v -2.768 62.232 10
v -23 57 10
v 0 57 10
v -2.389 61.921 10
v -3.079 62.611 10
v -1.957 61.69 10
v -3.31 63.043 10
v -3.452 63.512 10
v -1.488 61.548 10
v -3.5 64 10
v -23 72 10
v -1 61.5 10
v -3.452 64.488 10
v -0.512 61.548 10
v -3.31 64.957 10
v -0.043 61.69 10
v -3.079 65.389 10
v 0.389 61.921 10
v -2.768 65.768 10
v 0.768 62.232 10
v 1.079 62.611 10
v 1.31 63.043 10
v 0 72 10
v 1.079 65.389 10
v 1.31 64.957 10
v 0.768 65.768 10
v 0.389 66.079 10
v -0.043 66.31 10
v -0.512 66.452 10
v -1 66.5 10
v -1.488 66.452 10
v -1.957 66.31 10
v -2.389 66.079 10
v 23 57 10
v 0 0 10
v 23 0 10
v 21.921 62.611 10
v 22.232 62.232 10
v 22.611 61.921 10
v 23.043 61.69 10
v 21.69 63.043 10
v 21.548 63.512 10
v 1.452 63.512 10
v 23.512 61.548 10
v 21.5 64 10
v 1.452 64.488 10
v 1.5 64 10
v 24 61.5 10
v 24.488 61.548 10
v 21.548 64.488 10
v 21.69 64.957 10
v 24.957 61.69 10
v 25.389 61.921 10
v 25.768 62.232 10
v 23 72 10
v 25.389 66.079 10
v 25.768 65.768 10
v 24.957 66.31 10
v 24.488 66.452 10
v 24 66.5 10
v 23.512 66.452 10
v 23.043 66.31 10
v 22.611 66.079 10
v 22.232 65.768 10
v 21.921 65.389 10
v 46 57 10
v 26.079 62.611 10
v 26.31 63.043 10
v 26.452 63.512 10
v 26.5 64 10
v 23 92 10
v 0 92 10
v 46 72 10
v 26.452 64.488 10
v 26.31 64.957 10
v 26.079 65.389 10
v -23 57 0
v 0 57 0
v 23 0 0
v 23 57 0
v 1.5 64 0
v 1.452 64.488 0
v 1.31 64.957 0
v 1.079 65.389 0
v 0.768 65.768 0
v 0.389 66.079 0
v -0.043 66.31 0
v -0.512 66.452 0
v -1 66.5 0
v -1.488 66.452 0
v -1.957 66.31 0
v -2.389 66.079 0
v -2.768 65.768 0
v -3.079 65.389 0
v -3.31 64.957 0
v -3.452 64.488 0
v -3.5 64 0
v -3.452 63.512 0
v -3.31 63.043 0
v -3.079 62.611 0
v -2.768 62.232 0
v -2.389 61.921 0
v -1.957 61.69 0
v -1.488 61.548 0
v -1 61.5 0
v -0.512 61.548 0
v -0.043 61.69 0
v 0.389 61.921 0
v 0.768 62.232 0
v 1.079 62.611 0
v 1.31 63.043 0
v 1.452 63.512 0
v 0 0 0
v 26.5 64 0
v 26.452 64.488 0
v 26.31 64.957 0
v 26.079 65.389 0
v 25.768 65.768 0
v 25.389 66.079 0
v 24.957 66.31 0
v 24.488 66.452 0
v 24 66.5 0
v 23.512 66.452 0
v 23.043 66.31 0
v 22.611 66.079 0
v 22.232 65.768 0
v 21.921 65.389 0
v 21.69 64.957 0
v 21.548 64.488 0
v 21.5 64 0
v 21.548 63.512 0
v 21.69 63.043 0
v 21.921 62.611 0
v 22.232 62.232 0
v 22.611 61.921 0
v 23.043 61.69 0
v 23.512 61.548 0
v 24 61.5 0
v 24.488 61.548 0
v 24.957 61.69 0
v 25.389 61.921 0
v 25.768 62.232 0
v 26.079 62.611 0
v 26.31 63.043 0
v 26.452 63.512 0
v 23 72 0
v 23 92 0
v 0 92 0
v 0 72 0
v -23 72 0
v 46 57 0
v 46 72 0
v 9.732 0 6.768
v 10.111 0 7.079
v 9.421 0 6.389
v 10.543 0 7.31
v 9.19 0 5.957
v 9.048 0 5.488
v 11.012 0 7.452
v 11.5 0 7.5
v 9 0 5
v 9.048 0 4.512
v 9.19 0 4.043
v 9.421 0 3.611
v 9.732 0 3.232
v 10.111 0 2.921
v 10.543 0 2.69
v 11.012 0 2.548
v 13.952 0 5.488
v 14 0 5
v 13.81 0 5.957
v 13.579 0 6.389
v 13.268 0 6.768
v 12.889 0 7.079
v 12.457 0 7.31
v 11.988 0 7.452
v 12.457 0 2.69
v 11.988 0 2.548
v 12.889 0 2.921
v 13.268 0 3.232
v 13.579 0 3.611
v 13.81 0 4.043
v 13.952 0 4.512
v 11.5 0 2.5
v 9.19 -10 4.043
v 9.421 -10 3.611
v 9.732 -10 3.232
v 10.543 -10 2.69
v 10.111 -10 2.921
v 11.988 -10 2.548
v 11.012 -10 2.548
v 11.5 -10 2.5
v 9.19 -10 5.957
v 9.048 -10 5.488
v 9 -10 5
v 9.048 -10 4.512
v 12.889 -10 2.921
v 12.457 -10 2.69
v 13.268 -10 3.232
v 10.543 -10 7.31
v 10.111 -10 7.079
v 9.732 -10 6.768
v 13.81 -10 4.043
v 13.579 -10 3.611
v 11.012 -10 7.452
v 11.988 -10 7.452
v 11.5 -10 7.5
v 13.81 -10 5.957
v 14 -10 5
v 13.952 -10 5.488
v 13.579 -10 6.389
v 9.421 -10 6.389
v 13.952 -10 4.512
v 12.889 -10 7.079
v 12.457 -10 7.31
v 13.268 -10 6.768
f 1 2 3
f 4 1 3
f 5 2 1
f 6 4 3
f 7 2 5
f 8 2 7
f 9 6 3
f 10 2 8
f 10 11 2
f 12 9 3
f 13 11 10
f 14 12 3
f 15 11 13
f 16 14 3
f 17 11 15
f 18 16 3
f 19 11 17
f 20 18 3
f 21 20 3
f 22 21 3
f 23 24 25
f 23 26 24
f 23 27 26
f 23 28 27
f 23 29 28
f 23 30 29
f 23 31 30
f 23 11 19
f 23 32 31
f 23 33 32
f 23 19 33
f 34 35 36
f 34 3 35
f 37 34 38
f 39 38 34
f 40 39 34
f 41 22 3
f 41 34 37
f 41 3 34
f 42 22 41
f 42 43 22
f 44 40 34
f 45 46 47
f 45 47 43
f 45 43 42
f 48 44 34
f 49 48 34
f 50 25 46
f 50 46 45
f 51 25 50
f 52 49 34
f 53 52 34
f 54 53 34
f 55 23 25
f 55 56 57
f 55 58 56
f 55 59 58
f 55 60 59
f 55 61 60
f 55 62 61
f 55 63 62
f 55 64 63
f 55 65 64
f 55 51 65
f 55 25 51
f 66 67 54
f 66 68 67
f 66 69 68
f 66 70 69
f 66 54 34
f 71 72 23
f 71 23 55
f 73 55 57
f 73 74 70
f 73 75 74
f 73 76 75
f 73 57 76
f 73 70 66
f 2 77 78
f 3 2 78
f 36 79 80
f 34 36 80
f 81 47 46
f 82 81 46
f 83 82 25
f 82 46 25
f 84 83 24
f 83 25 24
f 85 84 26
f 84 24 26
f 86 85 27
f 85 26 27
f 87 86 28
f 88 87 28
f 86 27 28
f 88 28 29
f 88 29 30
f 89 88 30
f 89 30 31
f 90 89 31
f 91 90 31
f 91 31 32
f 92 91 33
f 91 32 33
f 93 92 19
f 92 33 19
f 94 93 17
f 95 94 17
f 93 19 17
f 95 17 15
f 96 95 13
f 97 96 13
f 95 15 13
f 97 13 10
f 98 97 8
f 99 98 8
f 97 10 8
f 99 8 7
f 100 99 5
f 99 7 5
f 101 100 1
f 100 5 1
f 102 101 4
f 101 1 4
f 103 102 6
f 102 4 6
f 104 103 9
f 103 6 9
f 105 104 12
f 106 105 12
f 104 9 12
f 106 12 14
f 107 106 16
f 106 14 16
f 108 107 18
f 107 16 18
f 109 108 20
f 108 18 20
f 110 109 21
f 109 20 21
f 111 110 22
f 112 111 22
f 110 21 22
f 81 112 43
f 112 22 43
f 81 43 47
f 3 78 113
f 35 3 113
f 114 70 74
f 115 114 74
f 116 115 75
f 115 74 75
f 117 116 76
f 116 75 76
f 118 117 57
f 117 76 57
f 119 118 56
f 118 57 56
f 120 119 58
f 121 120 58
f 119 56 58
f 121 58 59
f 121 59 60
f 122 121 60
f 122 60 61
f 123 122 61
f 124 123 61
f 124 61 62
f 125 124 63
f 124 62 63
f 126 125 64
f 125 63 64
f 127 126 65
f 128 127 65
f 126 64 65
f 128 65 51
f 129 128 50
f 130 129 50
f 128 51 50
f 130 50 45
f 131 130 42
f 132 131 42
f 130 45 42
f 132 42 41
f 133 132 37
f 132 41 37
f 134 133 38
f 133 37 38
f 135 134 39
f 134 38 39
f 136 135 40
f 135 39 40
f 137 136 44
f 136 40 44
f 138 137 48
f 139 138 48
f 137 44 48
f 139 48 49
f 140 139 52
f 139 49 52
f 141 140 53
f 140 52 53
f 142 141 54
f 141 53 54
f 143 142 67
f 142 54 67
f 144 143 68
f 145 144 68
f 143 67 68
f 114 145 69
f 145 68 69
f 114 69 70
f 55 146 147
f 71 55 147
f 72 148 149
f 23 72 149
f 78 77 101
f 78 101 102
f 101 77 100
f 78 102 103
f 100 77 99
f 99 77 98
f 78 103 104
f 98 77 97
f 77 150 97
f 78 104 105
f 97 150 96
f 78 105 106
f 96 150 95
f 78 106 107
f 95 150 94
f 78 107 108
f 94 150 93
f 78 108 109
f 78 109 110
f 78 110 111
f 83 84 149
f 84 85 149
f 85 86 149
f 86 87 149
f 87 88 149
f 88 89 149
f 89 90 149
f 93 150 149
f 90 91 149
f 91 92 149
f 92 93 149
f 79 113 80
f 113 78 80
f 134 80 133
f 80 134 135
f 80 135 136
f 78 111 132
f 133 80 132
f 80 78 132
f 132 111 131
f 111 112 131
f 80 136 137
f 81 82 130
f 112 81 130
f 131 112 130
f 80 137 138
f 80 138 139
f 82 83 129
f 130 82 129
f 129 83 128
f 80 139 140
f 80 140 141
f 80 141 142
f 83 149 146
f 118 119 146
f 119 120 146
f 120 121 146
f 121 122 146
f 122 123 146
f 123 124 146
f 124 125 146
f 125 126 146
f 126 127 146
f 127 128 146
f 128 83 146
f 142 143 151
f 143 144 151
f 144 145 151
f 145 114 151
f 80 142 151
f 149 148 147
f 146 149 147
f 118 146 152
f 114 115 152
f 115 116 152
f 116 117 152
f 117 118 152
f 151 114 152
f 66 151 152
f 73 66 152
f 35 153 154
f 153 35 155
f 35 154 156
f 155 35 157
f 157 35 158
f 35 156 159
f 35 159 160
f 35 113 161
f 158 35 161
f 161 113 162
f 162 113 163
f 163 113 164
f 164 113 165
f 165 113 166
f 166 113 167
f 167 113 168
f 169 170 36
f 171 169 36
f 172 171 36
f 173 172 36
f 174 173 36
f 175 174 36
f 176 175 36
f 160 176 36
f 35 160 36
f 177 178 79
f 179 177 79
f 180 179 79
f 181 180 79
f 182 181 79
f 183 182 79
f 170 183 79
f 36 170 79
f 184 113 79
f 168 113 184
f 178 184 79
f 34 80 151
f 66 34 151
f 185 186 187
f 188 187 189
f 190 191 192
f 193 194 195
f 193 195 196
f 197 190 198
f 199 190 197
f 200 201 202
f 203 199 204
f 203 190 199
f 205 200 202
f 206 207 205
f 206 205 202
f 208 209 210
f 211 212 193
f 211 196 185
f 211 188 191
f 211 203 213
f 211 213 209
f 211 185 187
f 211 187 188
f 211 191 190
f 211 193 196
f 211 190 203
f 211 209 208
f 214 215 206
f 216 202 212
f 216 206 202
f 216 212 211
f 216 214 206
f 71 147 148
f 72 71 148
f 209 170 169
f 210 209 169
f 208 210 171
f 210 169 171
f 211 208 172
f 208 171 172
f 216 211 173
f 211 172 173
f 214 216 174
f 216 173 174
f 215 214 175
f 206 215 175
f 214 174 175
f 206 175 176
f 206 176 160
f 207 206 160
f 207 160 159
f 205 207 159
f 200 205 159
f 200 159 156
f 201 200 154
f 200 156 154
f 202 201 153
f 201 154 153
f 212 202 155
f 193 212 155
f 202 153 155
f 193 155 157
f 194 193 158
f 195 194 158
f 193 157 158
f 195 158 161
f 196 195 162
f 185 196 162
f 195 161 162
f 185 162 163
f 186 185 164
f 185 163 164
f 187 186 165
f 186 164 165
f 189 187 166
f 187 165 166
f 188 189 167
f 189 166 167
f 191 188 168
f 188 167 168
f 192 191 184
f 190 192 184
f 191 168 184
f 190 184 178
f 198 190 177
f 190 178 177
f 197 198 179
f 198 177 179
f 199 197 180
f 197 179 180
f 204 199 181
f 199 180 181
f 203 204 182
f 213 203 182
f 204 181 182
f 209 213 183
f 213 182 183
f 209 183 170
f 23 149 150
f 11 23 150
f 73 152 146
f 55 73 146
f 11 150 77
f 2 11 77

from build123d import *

# Parameters (mm, degrees)
PAD_DEPTH    = 10
SKETCH001_R  = 2.5
PAD001_DEPTH = 10
SKETCH002_R  = 2.5
POCKET_DEPTH = 10


with BuildPart() as part:
    # Sketch → Pad (new body)
    with BuildSketch(Plane.XY):
        Polygon((0, 0), (23, 0), (23, 57), (46, 57), (46, 72), (23, 72), (23, 92), (0, 92), (0, 72), (-23, 72), (-23, 57), (0, 57), align=None)
    extrude(amount=PAD_DEPTH)

    # Sketch001 → Pad001 (new body)
    with BuildSketch(Plane.XZ):
        with Locations((11.5, 5)):
            Circle(SKETCH001_R)
    extrude(amount=PAD001_DEPTH)

    # Sketch002 → Pocket (cut)
    with BuildSketch(Plane.XY.offset(10)):
        with Locations((24, 64)):
            Circle(SKETCH002_R)
        with Locations((-1, 64)):
            Circle(SKETCH002_R)
    extrude(amount=-POCKET_DEPTH, mode=Mode.SUBTRACT)


solid = part.part
